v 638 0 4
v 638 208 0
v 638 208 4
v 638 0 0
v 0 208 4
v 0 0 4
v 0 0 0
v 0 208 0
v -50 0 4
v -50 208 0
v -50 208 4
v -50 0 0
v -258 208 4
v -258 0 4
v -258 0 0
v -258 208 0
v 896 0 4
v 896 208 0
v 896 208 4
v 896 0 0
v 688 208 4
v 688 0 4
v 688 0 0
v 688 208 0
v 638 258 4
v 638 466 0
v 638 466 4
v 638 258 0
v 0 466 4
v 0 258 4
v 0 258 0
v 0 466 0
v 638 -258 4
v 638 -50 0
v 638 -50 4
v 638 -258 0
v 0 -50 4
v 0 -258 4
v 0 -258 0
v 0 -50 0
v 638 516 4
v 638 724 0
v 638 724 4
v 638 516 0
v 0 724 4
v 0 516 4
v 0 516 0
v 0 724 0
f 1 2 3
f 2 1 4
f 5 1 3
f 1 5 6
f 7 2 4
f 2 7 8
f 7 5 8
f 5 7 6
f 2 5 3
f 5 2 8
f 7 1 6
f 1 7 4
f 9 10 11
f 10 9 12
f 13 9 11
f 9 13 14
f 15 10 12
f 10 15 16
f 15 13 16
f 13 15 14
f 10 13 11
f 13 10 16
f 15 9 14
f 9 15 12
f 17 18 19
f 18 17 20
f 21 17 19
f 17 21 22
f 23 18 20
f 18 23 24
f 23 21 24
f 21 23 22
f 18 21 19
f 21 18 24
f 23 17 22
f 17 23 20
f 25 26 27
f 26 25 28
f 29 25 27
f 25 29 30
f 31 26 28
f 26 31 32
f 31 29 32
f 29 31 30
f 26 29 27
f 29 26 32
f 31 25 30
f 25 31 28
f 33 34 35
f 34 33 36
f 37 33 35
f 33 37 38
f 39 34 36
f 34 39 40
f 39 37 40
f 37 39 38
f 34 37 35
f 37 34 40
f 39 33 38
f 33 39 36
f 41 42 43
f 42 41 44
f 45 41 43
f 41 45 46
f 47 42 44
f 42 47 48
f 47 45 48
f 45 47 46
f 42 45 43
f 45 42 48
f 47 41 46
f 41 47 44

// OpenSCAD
// Set box dimensions
spool_width = 63;
spool_radius = 100;
mdf_thickness = 4;
spool_count = 10;

// Create the box

// Modules
module main_panel() {
  cube([(spool_width * spool_count) + (2 * mdf_thickness), 2 * (mdf_thickness + spool_radius), mdf_thickness]);
}

module side_panel() {
  cube([2 * (mdf_thickness + spool_radius), 2 * (mdf_thickness + spool_radius), mdf_thickness]);
}

module lid_pins() {

}

// Base panel
main_panel();

// Side panels
translate([-(2 * (mdf_thickness + spool_radius) + 50),0,0]) {
  side_panel();
}

translate([(spool_width * spool_count) + (2 * mdf_thickness) + 50, 0, 0]) {
  side_panel();
}

// Front/Back panels
translate([0, 2 * (mdf_thickness + spool_radius) + 50, 0]) {
  main_panel();
}

translate([0, -(50 + (2 * (mdf_thickness + spool_radius))), 0]) {
  main_panel();
}

// Lid
translate([0, 2 * (2 * (mdf_thickness + spool_radius) + 50), 0]) {
  main_panel();
}
